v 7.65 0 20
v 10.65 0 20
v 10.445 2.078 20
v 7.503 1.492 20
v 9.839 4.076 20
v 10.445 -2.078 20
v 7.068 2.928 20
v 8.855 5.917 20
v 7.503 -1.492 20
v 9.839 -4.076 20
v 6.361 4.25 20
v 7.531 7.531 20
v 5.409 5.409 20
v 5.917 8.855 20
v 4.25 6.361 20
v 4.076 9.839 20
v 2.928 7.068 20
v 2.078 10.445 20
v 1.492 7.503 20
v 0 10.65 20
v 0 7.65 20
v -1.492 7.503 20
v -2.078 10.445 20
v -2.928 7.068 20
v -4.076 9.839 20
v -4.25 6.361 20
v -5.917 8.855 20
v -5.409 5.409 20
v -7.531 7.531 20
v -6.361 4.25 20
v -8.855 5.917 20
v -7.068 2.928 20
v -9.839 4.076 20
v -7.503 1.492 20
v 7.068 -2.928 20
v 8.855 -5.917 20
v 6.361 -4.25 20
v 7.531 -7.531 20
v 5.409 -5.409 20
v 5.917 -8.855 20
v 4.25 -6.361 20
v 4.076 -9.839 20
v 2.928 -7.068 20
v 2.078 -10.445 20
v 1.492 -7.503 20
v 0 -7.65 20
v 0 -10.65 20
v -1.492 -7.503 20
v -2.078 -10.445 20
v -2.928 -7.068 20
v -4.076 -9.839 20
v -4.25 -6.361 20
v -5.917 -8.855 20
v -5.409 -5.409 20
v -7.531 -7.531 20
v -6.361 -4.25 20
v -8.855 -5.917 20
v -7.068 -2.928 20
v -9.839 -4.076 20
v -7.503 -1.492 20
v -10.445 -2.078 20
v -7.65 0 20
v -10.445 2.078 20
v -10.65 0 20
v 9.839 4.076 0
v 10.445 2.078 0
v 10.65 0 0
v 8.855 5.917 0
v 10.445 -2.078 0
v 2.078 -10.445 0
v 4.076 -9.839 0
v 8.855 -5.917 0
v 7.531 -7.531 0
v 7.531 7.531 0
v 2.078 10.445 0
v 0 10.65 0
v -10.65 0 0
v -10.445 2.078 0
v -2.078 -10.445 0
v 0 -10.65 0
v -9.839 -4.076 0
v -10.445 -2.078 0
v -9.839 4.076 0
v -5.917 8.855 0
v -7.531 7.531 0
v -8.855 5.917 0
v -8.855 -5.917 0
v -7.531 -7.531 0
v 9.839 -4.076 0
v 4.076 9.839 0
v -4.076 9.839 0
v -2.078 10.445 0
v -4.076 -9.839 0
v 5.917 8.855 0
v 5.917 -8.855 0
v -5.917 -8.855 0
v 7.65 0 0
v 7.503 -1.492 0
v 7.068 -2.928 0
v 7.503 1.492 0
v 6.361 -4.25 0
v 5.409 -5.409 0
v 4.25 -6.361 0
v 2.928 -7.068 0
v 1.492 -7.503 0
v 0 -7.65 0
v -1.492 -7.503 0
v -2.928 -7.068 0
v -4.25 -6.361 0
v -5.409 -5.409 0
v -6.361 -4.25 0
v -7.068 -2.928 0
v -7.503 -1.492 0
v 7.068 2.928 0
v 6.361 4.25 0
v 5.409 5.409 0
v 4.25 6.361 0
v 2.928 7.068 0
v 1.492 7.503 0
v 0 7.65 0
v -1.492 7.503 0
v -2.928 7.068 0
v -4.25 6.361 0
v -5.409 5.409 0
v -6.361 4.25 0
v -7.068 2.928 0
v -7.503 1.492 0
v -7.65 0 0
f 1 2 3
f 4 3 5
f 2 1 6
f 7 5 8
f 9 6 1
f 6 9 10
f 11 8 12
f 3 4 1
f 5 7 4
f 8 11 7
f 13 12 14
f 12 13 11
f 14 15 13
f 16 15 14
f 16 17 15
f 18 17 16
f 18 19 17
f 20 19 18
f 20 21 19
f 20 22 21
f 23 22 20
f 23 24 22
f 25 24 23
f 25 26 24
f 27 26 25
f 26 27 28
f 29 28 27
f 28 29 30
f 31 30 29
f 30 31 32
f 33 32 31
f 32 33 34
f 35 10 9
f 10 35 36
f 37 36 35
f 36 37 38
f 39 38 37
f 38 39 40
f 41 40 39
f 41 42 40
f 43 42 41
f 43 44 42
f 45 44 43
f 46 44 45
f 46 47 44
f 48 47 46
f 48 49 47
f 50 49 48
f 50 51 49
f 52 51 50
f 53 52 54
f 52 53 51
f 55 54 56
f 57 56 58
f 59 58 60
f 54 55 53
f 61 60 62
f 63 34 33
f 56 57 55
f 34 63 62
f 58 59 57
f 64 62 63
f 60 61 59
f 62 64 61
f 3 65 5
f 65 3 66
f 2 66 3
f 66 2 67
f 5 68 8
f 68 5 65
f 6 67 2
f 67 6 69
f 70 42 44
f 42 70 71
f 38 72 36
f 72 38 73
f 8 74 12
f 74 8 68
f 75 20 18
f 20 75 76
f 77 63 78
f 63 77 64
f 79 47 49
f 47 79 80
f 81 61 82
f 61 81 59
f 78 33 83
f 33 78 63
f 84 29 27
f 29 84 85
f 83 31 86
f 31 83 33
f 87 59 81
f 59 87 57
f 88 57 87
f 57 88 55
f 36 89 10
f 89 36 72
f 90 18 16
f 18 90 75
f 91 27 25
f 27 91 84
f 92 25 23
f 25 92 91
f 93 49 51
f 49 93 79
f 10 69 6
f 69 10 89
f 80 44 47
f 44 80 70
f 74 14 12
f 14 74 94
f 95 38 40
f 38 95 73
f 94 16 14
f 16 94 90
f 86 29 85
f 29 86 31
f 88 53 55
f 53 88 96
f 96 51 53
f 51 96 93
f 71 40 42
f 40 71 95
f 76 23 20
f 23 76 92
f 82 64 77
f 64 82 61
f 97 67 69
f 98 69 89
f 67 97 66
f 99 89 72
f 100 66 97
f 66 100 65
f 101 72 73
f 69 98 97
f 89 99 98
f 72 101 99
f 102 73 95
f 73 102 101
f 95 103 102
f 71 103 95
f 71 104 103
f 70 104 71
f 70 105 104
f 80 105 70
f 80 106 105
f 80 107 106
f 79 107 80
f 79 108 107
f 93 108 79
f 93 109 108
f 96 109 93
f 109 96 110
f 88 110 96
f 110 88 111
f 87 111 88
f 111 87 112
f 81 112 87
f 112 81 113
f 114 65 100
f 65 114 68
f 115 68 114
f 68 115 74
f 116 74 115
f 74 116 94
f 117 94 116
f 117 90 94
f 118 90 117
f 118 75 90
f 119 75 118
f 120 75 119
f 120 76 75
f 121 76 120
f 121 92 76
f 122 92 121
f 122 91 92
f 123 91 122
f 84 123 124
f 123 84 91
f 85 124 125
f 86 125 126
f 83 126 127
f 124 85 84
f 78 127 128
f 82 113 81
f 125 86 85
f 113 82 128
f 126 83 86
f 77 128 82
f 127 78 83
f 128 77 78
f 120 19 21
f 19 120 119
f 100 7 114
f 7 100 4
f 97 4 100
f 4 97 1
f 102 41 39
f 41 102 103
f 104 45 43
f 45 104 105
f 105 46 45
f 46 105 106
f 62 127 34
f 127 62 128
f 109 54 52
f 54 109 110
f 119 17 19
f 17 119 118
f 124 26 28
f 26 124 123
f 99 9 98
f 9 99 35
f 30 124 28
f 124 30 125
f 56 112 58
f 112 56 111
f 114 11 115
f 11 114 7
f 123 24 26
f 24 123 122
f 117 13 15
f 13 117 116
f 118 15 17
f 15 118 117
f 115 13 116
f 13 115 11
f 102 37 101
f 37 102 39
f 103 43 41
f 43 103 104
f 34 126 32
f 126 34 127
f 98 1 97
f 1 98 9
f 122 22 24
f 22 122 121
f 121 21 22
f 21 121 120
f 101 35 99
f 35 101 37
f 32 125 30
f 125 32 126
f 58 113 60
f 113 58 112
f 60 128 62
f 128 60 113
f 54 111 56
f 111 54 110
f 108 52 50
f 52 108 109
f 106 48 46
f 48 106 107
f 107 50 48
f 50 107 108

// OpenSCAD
$fn = 32;

// ----------------------------------------------------------------------
// Spacer sleeve: 21.3 / 15.3 x 20 mm
// ----------------------------------------------------------------------

// --- parameters (mm) ---
sleeve_od = 21.3;         // outside diameter
sleeve_id = 15.3;         // shaft bore
sleeve_l = 20;            // sleeve length
step_d = 19.8;            // reduced diameter
step_l = 6;               // length of the step

module sleeve() {
  cylinder(h = sleeve_l, d = sleeve_od);
  translate([0, 0, sleeve_l - step_l]) cylinder(h = step_l, d = step_d);
}

difference() {
  sleeve();
  translate([0, 0, -1]) cylinder(h = sleeve_l + 2, d = sleeve_id);
}
